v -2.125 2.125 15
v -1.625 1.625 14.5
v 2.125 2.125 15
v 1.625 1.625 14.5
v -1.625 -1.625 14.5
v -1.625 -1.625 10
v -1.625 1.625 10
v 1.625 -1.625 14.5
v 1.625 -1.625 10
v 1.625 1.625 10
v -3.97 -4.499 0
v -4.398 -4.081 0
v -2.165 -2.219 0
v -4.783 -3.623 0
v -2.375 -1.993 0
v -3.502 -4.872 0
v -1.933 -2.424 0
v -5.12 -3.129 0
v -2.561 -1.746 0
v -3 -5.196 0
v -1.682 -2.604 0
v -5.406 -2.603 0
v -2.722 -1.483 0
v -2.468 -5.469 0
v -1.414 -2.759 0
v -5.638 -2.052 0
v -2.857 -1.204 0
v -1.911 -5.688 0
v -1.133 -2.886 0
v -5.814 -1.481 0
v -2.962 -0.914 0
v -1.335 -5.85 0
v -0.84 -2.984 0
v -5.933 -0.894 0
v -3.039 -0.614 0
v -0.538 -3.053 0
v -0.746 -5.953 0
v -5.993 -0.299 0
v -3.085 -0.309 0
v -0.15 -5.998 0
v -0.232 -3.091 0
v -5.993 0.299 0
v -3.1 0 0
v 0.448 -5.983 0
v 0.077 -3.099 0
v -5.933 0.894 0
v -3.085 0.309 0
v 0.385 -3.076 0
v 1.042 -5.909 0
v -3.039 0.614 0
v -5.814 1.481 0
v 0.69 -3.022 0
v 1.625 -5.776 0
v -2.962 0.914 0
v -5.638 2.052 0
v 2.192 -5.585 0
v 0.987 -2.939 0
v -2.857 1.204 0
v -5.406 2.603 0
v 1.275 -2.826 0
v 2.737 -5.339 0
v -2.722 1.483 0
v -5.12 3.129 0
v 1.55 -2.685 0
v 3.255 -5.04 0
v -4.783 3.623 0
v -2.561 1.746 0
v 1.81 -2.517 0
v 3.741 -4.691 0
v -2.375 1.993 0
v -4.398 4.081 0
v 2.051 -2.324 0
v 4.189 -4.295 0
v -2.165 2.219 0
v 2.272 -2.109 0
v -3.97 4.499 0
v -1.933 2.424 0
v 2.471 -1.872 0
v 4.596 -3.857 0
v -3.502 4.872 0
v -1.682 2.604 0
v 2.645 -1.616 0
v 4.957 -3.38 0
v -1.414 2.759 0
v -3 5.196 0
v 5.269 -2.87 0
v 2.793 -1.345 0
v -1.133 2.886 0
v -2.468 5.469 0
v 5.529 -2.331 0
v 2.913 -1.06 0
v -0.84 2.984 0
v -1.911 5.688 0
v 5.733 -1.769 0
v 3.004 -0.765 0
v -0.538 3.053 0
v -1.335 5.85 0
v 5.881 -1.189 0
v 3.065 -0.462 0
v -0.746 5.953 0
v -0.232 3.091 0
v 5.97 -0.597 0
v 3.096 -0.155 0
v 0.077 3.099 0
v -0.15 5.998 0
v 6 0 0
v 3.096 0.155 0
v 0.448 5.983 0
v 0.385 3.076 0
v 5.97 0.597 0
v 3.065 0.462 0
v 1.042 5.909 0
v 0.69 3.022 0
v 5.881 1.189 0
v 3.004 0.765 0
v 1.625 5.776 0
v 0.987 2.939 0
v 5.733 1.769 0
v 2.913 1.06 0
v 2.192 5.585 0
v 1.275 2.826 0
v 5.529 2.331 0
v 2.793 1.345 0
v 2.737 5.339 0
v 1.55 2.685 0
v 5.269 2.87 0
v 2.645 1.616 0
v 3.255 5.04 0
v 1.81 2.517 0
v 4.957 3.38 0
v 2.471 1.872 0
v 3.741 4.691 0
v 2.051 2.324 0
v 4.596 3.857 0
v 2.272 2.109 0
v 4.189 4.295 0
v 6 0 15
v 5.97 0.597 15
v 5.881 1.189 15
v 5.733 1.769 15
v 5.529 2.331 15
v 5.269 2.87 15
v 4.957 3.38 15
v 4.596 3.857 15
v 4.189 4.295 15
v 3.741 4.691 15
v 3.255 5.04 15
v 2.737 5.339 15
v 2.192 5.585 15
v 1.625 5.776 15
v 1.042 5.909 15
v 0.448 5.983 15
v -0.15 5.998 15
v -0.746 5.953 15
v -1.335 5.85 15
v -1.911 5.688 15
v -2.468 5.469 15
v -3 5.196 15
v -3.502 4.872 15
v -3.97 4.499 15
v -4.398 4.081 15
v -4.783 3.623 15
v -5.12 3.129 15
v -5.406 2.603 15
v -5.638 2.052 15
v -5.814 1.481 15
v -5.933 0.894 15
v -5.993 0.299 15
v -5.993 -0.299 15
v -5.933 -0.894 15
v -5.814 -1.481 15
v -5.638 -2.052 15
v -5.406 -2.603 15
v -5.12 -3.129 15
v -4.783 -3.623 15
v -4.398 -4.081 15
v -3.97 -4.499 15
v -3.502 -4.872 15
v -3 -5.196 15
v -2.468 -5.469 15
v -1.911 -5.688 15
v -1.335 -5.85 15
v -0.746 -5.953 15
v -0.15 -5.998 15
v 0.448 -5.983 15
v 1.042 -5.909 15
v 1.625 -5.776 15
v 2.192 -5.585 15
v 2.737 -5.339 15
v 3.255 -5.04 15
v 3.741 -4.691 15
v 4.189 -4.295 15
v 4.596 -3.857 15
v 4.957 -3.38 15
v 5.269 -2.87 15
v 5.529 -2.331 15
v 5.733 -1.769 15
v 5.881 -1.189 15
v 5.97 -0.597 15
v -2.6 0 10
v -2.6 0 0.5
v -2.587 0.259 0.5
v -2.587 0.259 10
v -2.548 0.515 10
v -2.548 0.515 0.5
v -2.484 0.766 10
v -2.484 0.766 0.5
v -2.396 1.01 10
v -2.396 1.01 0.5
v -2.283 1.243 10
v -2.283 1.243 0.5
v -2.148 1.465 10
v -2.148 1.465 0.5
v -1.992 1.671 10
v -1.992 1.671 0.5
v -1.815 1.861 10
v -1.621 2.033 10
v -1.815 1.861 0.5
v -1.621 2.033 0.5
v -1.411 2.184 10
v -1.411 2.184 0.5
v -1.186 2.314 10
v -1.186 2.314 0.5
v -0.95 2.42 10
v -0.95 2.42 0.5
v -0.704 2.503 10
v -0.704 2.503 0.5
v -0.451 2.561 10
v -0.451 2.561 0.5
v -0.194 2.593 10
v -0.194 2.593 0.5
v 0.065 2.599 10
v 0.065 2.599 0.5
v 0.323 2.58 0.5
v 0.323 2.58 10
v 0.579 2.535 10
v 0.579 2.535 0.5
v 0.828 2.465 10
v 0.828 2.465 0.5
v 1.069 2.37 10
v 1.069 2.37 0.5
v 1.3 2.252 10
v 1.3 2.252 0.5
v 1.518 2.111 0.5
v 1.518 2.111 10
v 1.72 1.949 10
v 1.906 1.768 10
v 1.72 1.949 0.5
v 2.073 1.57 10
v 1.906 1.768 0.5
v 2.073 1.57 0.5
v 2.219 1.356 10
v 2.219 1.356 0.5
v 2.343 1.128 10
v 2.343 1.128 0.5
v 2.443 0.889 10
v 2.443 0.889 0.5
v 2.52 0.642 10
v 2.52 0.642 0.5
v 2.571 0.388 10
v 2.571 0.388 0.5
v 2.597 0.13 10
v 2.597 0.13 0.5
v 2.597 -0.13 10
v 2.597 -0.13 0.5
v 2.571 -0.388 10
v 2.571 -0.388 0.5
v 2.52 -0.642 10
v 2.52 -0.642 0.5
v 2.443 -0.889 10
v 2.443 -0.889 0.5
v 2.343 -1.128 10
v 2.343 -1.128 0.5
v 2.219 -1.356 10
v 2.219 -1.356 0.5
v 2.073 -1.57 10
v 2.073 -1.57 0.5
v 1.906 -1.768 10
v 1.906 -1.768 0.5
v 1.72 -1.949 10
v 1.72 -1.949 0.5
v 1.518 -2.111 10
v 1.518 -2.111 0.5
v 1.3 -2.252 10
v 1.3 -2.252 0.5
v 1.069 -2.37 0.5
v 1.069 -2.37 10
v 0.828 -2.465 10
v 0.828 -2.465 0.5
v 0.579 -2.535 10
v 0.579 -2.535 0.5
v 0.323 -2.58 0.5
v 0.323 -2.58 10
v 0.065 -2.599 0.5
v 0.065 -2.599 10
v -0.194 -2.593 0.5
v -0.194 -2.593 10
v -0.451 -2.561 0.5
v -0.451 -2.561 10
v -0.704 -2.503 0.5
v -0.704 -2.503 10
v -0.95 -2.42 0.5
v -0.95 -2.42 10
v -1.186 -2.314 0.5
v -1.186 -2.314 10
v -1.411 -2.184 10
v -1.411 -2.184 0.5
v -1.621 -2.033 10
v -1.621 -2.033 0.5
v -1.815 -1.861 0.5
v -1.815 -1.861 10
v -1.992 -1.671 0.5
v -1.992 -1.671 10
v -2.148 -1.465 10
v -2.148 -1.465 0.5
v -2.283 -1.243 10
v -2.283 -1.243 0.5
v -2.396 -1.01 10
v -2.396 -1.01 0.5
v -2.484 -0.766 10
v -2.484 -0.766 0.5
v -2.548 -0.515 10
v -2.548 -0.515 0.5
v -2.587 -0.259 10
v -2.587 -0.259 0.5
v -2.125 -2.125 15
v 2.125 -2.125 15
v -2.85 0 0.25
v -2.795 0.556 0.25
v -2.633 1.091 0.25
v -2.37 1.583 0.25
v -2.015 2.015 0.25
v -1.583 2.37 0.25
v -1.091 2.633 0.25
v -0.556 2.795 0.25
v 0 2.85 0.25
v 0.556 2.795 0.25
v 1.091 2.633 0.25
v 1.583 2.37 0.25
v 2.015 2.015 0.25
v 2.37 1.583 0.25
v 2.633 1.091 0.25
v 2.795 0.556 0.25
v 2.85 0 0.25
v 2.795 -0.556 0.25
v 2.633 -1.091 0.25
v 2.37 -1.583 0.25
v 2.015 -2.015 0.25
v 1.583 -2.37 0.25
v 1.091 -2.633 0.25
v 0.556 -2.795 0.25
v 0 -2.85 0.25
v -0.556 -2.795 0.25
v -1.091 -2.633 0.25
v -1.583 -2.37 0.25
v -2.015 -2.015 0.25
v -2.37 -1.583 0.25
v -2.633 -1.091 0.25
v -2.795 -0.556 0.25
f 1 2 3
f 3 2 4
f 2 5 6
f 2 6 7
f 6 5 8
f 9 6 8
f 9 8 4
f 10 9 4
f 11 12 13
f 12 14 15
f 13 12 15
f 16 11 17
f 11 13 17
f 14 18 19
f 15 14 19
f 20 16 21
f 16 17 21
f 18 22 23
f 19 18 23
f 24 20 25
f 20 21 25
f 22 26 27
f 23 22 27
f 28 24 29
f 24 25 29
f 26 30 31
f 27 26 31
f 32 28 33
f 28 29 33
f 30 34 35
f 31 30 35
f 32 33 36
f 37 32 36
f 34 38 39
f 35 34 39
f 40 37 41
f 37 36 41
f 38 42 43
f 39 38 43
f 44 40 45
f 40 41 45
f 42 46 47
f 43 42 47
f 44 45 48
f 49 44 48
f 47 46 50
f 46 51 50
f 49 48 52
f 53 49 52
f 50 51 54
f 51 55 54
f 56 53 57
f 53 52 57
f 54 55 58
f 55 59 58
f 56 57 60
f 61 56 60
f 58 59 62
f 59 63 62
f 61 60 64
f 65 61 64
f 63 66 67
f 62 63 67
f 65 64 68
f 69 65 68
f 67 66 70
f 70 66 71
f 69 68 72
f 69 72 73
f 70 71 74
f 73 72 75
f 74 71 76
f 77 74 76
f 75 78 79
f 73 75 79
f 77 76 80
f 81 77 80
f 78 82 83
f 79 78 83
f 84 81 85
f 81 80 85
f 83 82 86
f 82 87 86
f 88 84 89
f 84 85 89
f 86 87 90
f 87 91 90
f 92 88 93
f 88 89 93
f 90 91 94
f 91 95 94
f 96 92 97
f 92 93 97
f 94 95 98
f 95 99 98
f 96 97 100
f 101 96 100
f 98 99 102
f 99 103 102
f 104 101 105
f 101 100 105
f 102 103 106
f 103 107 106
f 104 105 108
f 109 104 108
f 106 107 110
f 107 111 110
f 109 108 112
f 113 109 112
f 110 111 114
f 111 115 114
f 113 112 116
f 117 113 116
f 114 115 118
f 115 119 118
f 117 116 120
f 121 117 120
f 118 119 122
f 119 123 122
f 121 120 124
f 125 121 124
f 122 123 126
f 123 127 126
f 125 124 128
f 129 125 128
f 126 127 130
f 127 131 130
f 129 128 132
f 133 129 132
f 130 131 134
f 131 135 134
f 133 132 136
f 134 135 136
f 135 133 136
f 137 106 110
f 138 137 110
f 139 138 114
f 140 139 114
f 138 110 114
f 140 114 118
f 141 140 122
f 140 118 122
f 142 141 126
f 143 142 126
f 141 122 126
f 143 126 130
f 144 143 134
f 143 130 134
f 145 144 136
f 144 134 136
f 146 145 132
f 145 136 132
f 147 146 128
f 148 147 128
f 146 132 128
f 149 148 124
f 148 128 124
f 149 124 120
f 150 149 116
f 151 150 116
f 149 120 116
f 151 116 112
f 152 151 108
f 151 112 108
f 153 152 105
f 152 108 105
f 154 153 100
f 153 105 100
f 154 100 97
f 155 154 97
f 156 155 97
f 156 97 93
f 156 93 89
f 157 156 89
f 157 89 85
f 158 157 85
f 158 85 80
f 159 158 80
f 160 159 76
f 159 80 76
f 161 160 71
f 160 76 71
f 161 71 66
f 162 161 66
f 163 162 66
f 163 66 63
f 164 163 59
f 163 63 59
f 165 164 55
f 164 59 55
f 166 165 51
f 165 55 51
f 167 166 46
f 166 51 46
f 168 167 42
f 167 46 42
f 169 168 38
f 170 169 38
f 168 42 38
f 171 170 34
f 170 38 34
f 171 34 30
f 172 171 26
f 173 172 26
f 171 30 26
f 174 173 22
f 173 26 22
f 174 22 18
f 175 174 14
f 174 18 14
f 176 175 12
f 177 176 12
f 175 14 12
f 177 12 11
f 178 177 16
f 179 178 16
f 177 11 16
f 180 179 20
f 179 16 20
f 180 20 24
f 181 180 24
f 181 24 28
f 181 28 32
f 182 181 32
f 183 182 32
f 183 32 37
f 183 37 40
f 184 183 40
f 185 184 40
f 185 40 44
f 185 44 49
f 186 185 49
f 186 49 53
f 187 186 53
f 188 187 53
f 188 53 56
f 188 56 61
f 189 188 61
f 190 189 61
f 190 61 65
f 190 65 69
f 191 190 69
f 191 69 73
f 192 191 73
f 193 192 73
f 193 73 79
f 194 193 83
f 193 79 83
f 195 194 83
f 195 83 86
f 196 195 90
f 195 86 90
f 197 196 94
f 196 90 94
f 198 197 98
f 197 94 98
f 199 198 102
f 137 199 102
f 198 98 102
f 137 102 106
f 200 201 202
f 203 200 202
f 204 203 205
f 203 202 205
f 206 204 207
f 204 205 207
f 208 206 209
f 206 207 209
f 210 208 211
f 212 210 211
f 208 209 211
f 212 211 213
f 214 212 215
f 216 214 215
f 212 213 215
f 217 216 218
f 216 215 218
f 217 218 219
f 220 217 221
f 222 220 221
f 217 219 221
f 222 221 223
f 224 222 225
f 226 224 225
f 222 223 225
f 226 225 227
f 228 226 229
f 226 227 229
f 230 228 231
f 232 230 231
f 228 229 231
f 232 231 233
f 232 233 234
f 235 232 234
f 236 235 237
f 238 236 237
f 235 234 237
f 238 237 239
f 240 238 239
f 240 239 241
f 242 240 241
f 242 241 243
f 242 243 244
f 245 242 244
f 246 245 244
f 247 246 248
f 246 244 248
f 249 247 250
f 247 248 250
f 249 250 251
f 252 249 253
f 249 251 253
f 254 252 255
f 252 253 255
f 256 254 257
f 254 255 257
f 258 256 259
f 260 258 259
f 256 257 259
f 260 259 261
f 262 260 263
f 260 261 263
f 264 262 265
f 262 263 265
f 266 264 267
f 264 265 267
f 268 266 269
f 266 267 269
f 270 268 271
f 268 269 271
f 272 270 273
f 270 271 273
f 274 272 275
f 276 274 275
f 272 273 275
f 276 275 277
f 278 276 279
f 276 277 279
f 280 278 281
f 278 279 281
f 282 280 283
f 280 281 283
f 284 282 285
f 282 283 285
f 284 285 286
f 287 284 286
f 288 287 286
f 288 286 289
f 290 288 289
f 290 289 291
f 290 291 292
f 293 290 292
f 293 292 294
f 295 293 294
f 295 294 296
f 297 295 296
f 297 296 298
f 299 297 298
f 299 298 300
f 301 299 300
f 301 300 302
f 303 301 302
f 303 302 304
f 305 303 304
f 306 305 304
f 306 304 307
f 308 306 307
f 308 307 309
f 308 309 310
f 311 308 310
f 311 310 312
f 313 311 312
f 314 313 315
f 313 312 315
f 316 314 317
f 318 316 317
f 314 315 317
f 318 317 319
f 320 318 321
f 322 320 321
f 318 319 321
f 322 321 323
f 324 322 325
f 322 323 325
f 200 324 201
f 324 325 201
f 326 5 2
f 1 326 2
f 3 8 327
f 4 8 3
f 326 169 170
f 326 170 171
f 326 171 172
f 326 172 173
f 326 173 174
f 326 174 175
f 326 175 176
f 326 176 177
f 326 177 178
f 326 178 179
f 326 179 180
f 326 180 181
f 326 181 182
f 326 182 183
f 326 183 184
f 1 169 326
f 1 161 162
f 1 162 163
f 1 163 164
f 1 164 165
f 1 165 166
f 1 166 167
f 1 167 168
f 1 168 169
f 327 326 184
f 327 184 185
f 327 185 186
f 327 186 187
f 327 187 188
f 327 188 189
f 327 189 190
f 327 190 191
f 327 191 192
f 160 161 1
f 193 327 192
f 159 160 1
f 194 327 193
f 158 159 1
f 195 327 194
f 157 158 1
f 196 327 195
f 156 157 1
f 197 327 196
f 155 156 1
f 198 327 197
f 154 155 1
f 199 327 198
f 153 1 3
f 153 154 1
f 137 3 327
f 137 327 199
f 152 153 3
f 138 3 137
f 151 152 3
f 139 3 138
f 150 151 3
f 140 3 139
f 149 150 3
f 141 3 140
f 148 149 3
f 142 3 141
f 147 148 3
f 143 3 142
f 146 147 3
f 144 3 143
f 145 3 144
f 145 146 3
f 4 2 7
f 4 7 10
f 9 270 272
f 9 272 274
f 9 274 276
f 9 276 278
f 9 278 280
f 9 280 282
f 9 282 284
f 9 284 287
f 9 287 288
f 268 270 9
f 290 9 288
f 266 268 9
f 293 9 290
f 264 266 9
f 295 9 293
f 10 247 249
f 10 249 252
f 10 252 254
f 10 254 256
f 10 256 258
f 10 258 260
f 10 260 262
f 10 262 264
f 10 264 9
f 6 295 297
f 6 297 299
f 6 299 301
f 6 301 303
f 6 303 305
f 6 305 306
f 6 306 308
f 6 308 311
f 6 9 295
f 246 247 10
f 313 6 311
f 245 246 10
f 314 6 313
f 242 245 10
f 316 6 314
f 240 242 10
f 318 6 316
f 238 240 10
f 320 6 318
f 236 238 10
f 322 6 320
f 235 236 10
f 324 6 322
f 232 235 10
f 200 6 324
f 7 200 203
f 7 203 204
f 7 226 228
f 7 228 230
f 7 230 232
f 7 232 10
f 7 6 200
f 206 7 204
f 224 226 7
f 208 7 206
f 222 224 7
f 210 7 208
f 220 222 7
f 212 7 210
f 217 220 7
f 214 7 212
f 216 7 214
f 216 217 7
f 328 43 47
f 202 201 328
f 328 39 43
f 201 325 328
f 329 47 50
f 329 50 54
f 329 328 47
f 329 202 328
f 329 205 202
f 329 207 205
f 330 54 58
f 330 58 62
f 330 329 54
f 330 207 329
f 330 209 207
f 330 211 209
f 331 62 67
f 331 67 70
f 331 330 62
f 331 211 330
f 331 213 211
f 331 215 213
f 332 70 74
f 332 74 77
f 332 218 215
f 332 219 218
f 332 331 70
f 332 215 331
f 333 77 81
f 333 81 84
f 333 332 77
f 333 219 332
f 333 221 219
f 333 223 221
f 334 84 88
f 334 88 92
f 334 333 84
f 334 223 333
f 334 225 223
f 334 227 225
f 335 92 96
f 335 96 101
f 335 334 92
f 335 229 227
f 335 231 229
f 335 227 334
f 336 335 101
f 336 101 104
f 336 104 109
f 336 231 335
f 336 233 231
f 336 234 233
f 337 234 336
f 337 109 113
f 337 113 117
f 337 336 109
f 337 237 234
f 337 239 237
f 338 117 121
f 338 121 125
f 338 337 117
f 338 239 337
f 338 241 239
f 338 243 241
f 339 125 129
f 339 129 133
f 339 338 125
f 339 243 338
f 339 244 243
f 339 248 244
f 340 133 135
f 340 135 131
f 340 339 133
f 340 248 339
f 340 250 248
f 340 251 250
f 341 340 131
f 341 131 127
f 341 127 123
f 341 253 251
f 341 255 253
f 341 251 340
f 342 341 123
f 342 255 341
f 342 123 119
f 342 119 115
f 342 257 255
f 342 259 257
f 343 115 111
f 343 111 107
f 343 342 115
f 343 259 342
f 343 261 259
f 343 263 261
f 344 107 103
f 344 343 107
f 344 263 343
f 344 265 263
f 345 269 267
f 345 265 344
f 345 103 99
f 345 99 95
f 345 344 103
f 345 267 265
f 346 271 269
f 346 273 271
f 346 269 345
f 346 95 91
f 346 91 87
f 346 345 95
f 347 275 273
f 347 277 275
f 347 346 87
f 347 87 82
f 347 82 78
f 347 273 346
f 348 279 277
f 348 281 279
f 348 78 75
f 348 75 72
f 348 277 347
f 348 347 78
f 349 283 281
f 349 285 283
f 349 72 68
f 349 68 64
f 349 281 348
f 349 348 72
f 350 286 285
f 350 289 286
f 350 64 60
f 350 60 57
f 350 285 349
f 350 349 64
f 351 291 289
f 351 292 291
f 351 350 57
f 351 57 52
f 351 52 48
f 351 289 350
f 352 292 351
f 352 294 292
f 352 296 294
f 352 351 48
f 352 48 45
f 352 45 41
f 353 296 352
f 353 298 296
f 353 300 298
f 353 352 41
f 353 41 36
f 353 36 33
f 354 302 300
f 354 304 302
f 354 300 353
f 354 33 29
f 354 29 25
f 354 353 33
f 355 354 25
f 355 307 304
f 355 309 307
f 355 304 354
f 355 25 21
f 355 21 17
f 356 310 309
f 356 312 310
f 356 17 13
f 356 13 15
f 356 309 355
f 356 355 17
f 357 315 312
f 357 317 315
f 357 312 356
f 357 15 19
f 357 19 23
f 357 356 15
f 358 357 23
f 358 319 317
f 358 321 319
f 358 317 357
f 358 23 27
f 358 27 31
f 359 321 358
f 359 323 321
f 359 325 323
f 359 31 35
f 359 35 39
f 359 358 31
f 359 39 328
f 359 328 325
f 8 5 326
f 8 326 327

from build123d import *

# Parameters (mm, degrees)
SKETCH1_R           = 6
BOSS_EXTRUDE1_DEPTH = 15
SKETCH2_R           = 2.6
CUT_EXTRUDE1_DEPTH  = 10
SKETCH5_W           = 3.25
SKETCH5_H           = 3.25
CUT_EXTRUDE2_DEPTH  = 5
CHAMFER1_SIZE       = 0.5


with BuildPart() as part:
    # Sketch1 → Boss-Extrude1 (new body)
    with BuildSketch(Plane.XY):
        Circle(SKETCH1_R)
    extrude(amount=BOSS_EXTRUDE1_DEPTH)

    # Sketch2 → Cut-Extrude1 (cut)
    with BuildSketch(Plane(origin=(0, 0, 0), x_dir=(-1, 0, 0), z_dir=(0, 0, -1))):
        Circle(SKETCH2_R)
    extrude(amount=-CUT_EXTRUDE1_DEPTH, mode=Mode.SUBTRACT)

    # Sketch5 → Cut-Extrude2 (cut)
    with BuildSketch(Plane.XY.offset(15)):
        Rectangle(SKETCH5_W, SKETCH5_H)
    extrude(amount=-CUT_EXTRUDE2_DEPTH, mode=Mode.SUBTRACT)

    # Chamfer1
    chamfer1_edges = [part.edges().sort_by_distance(p)[0] for p in [
        (1.625, 0, 15),
        (0, 1.625, 15),
        (-1.625, 0, 15),
        (0, -1.625, 15),
        (2.6, 0, 0),
    ]]
    chamfer(chamfer1_edges, length=CHAMFER1_SIZE)


solid = part.part
